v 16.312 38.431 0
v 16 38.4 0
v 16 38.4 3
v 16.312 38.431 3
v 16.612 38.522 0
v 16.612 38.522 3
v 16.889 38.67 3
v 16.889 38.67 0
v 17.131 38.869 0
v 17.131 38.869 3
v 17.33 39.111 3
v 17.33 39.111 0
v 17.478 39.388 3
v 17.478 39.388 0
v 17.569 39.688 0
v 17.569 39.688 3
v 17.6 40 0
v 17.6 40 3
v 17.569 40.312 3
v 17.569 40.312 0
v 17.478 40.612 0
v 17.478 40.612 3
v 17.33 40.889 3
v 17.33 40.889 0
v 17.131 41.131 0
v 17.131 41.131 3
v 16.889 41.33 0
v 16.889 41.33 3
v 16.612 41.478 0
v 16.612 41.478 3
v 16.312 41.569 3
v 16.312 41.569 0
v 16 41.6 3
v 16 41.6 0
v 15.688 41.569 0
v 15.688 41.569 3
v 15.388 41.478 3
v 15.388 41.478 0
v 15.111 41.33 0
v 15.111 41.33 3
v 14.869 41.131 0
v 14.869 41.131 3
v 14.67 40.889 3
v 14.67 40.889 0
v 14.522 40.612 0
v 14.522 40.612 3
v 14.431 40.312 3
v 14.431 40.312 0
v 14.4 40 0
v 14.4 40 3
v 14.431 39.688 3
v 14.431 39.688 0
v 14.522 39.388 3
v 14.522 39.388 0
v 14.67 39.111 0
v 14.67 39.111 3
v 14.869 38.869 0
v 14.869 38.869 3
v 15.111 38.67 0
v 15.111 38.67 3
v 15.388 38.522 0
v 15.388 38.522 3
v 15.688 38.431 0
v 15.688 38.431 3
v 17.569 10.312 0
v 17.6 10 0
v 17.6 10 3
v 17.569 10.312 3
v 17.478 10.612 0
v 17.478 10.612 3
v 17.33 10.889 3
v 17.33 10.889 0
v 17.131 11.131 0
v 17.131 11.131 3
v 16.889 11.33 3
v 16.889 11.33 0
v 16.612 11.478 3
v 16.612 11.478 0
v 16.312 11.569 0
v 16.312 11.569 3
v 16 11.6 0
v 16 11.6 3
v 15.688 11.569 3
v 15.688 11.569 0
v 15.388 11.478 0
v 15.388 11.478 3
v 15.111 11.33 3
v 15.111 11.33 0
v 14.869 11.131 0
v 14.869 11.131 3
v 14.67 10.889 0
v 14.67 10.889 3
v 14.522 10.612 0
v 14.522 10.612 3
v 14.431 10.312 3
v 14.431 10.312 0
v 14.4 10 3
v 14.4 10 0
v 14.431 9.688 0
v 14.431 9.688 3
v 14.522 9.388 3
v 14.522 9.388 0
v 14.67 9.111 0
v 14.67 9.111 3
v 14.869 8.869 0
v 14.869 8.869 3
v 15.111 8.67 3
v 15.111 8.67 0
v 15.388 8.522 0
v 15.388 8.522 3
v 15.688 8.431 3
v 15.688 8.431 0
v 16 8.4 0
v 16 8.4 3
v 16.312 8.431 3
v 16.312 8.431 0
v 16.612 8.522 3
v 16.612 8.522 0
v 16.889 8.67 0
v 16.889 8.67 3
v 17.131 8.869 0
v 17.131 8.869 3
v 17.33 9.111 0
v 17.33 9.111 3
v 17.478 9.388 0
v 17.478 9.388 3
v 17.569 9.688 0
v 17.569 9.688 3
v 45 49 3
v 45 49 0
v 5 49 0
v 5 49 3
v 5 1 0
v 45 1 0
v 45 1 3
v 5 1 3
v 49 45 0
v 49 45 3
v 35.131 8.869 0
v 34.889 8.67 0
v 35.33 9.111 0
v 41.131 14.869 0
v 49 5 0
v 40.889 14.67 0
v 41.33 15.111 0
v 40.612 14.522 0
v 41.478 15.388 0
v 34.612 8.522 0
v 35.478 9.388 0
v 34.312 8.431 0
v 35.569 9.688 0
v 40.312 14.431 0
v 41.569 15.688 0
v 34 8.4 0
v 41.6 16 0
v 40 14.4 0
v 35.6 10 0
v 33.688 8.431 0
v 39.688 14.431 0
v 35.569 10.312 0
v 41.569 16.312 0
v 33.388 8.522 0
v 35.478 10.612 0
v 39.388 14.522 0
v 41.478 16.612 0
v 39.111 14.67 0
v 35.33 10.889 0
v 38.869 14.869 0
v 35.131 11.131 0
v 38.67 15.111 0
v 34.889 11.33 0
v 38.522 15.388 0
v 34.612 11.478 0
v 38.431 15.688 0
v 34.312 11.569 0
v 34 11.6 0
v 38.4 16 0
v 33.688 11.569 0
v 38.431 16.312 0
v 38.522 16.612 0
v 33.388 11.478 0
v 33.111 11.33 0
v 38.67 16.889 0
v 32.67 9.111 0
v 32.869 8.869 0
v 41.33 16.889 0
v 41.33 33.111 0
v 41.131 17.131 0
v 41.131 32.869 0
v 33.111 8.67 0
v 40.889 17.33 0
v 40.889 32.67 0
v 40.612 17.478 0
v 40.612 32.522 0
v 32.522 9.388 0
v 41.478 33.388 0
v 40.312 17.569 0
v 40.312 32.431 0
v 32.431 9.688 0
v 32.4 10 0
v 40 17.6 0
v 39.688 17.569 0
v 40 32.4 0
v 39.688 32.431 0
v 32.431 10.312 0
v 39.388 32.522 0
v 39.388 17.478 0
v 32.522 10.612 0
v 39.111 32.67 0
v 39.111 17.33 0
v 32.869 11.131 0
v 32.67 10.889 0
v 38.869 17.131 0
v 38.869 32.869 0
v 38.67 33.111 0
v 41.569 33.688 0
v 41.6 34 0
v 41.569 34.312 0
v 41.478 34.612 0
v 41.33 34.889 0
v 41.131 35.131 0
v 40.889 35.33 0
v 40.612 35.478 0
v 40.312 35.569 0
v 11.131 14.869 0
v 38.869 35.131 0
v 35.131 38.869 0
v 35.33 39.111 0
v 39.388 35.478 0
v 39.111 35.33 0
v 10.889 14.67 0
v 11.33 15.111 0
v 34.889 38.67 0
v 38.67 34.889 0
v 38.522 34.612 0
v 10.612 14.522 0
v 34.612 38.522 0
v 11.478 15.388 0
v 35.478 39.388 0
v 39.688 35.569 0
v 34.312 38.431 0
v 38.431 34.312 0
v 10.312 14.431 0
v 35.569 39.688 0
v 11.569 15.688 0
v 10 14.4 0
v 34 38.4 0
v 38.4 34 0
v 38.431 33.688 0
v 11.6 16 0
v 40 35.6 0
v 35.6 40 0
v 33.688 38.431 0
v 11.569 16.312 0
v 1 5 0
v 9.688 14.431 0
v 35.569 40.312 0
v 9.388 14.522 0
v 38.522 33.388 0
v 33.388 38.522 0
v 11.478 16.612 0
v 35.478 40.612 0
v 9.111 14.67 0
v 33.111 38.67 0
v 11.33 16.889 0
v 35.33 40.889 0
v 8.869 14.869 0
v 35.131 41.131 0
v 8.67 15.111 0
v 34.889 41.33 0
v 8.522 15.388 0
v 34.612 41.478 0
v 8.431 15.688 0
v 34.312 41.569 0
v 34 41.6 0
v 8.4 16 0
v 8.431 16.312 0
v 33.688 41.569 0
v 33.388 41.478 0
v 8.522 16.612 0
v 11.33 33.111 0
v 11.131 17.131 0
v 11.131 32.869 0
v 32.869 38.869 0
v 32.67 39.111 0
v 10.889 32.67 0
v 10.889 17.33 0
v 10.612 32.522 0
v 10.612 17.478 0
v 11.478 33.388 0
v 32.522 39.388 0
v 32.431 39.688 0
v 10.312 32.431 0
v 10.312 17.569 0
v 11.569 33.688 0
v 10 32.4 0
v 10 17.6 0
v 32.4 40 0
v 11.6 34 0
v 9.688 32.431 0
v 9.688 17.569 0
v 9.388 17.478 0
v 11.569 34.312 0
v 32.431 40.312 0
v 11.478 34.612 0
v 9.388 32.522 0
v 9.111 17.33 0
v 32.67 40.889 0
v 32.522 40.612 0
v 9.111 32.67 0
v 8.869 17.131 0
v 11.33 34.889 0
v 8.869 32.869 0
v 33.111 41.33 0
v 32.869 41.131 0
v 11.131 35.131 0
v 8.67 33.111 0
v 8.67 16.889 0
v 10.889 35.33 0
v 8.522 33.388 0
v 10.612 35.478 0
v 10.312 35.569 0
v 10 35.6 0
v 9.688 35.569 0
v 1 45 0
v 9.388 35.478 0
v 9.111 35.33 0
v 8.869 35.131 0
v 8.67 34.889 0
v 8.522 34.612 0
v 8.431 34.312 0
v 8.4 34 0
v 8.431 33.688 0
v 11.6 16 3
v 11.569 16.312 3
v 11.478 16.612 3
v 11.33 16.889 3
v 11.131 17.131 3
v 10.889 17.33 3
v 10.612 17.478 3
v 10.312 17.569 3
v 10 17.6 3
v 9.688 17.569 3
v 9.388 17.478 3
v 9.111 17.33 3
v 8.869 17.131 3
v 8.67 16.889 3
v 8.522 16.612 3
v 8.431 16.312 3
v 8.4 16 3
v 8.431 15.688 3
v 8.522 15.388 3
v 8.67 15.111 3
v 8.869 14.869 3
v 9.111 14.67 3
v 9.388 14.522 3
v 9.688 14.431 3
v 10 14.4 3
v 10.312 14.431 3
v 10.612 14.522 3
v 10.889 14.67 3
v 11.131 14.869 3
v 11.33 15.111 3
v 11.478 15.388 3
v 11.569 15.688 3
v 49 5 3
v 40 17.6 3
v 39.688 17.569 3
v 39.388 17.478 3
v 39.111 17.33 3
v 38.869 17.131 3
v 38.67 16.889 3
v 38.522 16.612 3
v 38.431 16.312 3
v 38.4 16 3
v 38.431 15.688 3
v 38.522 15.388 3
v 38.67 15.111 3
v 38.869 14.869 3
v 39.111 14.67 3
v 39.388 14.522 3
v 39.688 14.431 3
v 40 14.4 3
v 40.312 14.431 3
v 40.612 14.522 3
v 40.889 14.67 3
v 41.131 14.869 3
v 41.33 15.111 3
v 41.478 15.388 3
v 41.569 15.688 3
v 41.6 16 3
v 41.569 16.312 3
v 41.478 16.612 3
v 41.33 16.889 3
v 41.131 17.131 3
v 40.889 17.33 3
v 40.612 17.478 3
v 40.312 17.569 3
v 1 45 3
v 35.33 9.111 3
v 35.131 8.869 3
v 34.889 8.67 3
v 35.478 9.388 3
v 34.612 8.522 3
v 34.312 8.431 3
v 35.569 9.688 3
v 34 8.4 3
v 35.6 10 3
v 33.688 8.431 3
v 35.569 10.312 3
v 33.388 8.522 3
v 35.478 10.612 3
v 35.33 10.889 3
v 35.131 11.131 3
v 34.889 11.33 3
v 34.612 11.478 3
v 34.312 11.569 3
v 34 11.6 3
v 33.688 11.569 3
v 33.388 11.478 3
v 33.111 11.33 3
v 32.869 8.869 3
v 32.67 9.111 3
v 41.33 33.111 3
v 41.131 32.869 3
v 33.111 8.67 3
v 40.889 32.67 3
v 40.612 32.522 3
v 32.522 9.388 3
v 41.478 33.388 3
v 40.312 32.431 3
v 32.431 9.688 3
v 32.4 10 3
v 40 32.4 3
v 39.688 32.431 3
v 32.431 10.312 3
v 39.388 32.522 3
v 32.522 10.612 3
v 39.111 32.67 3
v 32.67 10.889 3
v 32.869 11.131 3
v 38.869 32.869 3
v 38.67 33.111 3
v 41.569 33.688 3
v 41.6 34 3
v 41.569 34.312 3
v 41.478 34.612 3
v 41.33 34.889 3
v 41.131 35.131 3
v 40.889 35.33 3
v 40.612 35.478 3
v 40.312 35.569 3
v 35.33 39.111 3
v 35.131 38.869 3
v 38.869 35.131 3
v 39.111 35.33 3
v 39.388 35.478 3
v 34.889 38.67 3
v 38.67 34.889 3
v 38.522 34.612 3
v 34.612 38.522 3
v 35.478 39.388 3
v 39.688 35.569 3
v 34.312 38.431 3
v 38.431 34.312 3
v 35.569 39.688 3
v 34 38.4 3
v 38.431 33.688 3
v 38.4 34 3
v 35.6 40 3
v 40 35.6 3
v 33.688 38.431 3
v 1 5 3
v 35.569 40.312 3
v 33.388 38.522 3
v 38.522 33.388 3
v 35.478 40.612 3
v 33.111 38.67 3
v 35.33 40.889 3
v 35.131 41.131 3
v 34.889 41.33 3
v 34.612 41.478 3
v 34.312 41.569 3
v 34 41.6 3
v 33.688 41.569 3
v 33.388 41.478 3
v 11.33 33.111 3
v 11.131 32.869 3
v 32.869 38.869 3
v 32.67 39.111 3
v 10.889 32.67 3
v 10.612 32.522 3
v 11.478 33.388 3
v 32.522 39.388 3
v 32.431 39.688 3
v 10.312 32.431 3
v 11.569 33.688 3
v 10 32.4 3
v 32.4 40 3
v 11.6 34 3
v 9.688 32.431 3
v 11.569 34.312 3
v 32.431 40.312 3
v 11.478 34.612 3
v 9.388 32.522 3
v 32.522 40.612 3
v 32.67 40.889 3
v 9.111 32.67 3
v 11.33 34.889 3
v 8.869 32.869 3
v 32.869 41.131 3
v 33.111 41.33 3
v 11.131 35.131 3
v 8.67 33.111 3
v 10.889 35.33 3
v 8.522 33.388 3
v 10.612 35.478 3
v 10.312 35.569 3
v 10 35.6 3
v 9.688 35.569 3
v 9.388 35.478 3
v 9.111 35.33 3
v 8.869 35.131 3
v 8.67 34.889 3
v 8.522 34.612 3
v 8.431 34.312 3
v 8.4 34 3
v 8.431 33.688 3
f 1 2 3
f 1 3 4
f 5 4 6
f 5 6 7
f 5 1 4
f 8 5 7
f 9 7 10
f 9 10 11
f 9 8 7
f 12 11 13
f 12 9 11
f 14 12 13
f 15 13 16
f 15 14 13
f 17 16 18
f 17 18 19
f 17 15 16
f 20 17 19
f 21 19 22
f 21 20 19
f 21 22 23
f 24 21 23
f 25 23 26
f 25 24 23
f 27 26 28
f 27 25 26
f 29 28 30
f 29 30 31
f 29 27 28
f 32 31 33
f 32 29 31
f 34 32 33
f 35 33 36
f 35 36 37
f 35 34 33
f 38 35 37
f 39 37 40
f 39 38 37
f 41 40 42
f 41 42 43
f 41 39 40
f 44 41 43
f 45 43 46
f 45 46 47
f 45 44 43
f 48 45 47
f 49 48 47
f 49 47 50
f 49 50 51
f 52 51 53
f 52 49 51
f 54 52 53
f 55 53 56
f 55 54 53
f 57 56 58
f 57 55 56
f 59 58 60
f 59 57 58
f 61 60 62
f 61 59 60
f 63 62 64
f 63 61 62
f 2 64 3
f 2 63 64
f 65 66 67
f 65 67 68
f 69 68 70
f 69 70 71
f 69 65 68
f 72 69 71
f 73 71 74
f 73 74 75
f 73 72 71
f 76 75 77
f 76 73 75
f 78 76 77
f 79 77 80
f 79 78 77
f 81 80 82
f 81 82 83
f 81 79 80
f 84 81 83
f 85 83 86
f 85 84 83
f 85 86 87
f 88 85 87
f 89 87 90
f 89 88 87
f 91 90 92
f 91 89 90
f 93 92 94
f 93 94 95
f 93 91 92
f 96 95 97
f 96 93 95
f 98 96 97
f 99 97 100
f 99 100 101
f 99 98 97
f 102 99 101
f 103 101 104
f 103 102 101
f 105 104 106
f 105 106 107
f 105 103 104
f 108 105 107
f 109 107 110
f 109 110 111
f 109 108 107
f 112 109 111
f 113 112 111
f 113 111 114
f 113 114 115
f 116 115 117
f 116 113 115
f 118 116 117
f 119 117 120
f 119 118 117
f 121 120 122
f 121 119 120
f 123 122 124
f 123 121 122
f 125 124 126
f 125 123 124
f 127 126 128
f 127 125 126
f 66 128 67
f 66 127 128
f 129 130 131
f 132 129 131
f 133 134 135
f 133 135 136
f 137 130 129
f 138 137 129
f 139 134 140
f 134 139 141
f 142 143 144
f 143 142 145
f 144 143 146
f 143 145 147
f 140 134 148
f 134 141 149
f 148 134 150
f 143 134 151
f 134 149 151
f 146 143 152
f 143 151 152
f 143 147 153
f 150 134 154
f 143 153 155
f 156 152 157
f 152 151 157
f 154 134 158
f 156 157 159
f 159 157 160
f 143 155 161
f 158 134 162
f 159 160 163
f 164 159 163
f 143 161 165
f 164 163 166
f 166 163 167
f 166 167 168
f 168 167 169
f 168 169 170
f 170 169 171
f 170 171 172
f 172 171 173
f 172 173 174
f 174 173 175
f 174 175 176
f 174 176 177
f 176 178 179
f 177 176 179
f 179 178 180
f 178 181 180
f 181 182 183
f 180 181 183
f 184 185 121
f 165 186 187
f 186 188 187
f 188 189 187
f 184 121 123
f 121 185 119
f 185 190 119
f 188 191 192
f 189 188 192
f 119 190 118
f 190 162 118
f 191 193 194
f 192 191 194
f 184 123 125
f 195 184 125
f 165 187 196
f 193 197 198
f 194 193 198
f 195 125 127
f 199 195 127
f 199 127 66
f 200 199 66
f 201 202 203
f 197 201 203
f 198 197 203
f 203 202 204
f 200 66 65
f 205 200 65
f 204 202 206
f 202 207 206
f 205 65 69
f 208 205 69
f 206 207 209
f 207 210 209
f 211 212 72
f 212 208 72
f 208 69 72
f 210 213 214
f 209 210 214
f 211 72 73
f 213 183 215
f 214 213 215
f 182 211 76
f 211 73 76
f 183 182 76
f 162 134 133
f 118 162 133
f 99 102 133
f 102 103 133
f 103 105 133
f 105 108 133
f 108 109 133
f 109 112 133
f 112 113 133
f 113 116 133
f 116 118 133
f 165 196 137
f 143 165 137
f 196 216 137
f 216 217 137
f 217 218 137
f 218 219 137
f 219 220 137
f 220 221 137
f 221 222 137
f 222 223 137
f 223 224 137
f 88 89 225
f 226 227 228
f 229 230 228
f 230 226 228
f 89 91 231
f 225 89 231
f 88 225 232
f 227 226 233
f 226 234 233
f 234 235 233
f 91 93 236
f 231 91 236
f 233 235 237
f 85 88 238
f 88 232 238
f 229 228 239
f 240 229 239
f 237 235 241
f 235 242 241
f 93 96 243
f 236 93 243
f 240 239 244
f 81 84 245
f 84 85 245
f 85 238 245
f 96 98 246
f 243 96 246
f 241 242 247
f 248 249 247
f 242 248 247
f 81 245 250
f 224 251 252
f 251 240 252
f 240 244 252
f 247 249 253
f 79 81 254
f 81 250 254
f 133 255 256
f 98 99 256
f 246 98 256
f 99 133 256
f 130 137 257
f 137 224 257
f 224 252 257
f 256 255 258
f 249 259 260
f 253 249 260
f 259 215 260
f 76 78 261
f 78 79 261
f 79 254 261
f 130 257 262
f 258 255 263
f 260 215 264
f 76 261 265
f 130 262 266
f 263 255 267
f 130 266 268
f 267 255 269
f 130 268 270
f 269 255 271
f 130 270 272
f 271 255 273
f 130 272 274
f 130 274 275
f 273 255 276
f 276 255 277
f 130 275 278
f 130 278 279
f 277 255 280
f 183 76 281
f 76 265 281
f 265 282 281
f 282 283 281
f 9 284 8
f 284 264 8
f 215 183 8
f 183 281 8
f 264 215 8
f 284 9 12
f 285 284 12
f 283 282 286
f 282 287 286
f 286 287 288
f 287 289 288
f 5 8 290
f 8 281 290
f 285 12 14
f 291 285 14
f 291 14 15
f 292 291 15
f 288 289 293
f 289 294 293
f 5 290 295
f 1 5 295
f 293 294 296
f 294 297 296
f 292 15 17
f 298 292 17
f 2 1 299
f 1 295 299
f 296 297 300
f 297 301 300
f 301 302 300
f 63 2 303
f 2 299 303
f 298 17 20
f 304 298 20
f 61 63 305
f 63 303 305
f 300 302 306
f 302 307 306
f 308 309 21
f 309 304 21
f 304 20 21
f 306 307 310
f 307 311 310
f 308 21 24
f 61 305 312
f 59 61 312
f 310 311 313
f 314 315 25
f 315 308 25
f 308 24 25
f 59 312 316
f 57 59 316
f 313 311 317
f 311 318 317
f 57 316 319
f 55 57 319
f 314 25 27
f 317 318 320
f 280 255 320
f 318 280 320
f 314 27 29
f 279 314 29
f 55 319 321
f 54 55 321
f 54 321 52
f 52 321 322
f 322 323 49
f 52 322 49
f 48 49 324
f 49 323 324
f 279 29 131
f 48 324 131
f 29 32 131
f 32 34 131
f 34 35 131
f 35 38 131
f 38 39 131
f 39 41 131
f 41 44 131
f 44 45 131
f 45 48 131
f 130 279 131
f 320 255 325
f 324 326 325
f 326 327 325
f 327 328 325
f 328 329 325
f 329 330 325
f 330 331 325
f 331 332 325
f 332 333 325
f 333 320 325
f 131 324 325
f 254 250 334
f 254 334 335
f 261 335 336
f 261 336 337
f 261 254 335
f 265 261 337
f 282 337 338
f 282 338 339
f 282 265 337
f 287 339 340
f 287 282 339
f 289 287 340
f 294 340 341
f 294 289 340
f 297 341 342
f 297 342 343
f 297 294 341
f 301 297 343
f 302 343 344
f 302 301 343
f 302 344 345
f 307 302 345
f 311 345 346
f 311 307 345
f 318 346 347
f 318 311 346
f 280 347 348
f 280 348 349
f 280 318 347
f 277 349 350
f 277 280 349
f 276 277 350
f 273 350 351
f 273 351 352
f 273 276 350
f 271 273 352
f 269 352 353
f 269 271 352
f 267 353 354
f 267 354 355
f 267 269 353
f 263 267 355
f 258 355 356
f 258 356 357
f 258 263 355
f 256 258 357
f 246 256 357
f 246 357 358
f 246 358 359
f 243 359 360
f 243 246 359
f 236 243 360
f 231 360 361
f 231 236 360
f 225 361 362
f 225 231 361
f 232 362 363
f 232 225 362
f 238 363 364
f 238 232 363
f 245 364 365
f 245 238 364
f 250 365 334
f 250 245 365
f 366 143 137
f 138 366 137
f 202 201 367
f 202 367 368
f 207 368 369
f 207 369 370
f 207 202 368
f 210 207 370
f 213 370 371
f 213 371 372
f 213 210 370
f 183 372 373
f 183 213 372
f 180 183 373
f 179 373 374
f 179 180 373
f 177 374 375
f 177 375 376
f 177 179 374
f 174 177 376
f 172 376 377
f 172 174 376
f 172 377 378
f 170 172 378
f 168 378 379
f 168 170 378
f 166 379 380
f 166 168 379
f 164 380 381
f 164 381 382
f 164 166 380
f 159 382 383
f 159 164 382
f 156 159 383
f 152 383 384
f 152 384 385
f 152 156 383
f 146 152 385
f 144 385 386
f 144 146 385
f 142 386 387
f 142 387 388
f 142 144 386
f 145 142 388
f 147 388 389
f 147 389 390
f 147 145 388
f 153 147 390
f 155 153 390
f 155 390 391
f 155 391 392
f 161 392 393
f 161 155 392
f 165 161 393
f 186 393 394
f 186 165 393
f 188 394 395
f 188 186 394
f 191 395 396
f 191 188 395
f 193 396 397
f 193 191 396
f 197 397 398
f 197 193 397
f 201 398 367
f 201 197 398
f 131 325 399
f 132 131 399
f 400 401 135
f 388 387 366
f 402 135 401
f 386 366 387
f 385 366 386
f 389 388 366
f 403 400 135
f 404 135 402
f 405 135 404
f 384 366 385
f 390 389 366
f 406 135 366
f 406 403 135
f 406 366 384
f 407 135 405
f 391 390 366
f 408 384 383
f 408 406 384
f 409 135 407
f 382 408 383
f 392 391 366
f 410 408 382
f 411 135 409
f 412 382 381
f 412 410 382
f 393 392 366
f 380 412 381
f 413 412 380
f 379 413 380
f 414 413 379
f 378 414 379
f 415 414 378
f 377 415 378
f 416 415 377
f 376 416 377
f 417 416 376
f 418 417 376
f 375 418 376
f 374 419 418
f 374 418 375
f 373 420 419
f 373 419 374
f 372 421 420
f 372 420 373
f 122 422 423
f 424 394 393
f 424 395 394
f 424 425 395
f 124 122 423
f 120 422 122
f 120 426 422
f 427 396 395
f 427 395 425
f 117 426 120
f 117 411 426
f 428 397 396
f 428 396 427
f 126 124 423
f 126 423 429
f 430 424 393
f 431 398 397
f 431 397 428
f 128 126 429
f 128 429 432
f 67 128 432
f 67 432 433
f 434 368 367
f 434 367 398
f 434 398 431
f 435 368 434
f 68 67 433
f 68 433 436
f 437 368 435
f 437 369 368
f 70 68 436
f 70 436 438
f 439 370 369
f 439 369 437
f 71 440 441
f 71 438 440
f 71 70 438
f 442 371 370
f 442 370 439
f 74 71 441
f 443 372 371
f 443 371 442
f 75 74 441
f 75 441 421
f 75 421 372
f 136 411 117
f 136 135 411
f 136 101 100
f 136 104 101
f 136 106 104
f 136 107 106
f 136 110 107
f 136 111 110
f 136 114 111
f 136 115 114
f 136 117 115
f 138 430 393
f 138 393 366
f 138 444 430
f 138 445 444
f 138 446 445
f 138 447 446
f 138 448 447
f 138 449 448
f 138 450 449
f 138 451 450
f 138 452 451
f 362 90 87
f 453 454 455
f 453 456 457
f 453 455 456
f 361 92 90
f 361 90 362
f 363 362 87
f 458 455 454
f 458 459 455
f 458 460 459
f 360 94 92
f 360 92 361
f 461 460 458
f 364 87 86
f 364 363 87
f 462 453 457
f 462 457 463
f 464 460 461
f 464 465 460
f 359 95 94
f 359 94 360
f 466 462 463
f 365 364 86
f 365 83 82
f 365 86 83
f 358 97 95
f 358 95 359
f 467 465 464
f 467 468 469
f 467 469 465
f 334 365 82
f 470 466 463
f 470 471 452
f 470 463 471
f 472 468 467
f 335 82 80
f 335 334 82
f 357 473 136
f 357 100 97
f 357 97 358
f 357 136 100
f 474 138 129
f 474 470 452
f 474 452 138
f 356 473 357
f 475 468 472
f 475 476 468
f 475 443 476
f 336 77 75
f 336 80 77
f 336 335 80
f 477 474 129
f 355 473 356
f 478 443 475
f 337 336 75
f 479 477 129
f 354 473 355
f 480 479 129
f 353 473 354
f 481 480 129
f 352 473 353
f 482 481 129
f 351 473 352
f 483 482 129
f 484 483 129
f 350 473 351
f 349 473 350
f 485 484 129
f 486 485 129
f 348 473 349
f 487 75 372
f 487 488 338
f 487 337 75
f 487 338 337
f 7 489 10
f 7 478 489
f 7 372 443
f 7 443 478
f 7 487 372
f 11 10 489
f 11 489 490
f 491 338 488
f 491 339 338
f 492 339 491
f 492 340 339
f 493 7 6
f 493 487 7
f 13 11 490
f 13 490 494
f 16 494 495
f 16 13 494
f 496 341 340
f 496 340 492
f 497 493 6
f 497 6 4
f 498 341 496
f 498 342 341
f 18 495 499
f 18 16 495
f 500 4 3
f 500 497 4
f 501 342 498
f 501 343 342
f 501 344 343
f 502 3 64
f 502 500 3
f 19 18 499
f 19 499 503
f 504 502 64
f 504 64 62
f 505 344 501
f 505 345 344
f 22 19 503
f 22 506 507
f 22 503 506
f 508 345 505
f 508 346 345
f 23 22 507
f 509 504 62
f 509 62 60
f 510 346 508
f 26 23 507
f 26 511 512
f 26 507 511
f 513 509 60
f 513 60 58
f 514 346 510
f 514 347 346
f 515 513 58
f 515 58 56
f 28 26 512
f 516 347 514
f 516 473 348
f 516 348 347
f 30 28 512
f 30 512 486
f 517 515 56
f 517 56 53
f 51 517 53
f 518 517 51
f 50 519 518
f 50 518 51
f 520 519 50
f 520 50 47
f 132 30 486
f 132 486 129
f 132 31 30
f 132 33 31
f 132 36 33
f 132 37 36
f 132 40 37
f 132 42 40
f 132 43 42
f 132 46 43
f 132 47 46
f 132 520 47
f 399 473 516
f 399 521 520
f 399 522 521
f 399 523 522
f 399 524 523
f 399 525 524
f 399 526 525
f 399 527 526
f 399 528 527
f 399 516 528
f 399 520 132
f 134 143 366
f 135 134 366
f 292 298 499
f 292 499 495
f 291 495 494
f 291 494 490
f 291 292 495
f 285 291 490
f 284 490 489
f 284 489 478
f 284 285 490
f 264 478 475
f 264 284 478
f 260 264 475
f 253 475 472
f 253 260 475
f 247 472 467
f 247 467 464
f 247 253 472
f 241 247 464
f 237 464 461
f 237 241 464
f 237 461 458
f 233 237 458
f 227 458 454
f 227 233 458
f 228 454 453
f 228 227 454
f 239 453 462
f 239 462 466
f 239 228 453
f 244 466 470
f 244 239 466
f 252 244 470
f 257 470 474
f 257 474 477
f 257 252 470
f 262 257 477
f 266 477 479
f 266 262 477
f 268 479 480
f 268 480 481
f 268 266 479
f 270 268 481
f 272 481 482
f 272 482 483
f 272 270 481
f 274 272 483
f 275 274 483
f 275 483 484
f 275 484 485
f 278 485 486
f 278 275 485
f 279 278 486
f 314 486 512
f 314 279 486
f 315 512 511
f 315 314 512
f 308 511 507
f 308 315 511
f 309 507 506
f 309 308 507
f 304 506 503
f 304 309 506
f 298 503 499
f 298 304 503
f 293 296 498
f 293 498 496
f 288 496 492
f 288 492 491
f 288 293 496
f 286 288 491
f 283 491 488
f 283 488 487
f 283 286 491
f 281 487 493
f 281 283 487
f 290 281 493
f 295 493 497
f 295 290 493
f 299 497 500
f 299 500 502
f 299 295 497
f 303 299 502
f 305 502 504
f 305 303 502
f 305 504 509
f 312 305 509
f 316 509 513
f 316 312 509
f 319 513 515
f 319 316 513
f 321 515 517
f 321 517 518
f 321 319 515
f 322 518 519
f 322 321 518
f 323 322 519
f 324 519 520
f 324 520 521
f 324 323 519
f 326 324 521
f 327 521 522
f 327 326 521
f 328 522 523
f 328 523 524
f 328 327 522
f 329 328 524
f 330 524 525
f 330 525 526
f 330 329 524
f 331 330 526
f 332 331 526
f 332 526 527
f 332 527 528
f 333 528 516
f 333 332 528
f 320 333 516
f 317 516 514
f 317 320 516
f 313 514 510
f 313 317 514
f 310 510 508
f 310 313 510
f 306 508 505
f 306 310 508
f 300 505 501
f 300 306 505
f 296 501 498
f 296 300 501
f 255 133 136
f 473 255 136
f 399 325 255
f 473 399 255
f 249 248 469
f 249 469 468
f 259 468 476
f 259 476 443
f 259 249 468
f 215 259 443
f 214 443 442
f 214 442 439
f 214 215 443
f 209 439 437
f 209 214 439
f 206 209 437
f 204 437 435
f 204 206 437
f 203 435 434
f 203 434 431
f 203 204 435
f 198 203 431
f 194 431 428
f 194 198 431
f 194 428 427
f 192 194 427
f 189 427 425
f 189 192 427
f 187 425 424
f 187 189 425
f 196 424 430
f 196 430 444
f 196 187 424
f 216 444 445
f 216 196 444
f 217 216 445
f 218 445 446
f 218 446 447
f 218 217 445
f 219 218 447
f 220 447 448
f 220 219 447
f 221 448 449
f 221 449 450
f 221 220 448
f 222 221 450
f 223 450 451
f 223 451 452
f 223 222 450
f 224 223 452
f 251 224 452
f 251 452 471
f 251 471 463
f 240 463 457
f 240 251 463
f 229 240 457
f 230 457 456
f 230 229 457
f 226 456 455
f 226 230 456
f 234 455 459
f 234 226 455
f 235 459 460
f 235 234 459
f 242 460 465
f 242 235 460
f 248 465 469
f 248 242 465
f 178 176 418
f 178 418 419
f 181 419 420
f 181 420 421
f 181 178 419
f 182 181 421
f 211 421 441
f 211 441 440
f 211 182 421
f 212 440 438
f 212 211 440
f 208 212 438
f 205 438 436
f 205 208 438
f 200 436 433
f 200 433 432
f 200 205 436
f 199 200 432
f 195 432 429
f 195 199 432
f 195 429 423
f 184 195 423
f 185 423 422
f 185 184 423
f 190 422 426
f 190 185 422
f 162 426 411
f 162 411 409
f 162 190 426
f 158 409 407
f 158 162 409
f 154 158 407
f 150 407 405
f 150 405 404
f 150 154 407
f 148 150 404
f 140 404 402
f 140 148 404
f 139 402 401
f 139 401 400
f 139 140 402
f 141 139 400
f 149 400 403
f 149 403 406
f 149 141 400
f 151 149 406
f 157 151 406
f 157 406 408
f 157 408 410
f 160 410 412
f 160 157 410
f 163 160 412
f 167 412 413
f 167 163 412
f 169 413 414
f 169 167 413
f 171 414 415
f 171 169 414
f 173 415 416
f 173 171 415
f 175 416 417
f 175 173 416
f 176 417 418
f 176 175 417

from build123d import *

# Parameters (mm, degrees)
F0_W     = 24
F0_H     = 24
F0_R     = 1.6
F1_DEPTH = 3
F2_SIZE  = 4
F3_COUNT = 4


with BuildPart() as f1:
    # F0 (on Top) → F1 (new body)
    with BuildSketch(Plane.XY):
        with Locations((13, 13)):
            Rectangle(F0_W, F0_H)
        with Locations((16, 10)):
            Circle(F0_R, mode=Mode.SUBTRACT)
        with Locations((10, 16)):
            Circle(F0_R, mode=Mode.SUBTRACT)
    extrude(amount=F1_DEPTH)

    # F2
    f2_edges = [f1.edges().sort_by_distance(p)[0] for p in [
        (1, 1, 1.5),
    ]]
    chamfer(f2_edges, length=F2_SIZE)

    # F3: F1 ×4 about axis
    f3_axis = Axis((25, 25, 1.5), (0, 0, -1))


with BuildPart() as f1_1:
    add(f1.part)
    for i in range(1, F3_COUNT):
        add(f1.part.rotate(f3_axis, i * 360 / F3_COUNT))


solid = f1_1.part
